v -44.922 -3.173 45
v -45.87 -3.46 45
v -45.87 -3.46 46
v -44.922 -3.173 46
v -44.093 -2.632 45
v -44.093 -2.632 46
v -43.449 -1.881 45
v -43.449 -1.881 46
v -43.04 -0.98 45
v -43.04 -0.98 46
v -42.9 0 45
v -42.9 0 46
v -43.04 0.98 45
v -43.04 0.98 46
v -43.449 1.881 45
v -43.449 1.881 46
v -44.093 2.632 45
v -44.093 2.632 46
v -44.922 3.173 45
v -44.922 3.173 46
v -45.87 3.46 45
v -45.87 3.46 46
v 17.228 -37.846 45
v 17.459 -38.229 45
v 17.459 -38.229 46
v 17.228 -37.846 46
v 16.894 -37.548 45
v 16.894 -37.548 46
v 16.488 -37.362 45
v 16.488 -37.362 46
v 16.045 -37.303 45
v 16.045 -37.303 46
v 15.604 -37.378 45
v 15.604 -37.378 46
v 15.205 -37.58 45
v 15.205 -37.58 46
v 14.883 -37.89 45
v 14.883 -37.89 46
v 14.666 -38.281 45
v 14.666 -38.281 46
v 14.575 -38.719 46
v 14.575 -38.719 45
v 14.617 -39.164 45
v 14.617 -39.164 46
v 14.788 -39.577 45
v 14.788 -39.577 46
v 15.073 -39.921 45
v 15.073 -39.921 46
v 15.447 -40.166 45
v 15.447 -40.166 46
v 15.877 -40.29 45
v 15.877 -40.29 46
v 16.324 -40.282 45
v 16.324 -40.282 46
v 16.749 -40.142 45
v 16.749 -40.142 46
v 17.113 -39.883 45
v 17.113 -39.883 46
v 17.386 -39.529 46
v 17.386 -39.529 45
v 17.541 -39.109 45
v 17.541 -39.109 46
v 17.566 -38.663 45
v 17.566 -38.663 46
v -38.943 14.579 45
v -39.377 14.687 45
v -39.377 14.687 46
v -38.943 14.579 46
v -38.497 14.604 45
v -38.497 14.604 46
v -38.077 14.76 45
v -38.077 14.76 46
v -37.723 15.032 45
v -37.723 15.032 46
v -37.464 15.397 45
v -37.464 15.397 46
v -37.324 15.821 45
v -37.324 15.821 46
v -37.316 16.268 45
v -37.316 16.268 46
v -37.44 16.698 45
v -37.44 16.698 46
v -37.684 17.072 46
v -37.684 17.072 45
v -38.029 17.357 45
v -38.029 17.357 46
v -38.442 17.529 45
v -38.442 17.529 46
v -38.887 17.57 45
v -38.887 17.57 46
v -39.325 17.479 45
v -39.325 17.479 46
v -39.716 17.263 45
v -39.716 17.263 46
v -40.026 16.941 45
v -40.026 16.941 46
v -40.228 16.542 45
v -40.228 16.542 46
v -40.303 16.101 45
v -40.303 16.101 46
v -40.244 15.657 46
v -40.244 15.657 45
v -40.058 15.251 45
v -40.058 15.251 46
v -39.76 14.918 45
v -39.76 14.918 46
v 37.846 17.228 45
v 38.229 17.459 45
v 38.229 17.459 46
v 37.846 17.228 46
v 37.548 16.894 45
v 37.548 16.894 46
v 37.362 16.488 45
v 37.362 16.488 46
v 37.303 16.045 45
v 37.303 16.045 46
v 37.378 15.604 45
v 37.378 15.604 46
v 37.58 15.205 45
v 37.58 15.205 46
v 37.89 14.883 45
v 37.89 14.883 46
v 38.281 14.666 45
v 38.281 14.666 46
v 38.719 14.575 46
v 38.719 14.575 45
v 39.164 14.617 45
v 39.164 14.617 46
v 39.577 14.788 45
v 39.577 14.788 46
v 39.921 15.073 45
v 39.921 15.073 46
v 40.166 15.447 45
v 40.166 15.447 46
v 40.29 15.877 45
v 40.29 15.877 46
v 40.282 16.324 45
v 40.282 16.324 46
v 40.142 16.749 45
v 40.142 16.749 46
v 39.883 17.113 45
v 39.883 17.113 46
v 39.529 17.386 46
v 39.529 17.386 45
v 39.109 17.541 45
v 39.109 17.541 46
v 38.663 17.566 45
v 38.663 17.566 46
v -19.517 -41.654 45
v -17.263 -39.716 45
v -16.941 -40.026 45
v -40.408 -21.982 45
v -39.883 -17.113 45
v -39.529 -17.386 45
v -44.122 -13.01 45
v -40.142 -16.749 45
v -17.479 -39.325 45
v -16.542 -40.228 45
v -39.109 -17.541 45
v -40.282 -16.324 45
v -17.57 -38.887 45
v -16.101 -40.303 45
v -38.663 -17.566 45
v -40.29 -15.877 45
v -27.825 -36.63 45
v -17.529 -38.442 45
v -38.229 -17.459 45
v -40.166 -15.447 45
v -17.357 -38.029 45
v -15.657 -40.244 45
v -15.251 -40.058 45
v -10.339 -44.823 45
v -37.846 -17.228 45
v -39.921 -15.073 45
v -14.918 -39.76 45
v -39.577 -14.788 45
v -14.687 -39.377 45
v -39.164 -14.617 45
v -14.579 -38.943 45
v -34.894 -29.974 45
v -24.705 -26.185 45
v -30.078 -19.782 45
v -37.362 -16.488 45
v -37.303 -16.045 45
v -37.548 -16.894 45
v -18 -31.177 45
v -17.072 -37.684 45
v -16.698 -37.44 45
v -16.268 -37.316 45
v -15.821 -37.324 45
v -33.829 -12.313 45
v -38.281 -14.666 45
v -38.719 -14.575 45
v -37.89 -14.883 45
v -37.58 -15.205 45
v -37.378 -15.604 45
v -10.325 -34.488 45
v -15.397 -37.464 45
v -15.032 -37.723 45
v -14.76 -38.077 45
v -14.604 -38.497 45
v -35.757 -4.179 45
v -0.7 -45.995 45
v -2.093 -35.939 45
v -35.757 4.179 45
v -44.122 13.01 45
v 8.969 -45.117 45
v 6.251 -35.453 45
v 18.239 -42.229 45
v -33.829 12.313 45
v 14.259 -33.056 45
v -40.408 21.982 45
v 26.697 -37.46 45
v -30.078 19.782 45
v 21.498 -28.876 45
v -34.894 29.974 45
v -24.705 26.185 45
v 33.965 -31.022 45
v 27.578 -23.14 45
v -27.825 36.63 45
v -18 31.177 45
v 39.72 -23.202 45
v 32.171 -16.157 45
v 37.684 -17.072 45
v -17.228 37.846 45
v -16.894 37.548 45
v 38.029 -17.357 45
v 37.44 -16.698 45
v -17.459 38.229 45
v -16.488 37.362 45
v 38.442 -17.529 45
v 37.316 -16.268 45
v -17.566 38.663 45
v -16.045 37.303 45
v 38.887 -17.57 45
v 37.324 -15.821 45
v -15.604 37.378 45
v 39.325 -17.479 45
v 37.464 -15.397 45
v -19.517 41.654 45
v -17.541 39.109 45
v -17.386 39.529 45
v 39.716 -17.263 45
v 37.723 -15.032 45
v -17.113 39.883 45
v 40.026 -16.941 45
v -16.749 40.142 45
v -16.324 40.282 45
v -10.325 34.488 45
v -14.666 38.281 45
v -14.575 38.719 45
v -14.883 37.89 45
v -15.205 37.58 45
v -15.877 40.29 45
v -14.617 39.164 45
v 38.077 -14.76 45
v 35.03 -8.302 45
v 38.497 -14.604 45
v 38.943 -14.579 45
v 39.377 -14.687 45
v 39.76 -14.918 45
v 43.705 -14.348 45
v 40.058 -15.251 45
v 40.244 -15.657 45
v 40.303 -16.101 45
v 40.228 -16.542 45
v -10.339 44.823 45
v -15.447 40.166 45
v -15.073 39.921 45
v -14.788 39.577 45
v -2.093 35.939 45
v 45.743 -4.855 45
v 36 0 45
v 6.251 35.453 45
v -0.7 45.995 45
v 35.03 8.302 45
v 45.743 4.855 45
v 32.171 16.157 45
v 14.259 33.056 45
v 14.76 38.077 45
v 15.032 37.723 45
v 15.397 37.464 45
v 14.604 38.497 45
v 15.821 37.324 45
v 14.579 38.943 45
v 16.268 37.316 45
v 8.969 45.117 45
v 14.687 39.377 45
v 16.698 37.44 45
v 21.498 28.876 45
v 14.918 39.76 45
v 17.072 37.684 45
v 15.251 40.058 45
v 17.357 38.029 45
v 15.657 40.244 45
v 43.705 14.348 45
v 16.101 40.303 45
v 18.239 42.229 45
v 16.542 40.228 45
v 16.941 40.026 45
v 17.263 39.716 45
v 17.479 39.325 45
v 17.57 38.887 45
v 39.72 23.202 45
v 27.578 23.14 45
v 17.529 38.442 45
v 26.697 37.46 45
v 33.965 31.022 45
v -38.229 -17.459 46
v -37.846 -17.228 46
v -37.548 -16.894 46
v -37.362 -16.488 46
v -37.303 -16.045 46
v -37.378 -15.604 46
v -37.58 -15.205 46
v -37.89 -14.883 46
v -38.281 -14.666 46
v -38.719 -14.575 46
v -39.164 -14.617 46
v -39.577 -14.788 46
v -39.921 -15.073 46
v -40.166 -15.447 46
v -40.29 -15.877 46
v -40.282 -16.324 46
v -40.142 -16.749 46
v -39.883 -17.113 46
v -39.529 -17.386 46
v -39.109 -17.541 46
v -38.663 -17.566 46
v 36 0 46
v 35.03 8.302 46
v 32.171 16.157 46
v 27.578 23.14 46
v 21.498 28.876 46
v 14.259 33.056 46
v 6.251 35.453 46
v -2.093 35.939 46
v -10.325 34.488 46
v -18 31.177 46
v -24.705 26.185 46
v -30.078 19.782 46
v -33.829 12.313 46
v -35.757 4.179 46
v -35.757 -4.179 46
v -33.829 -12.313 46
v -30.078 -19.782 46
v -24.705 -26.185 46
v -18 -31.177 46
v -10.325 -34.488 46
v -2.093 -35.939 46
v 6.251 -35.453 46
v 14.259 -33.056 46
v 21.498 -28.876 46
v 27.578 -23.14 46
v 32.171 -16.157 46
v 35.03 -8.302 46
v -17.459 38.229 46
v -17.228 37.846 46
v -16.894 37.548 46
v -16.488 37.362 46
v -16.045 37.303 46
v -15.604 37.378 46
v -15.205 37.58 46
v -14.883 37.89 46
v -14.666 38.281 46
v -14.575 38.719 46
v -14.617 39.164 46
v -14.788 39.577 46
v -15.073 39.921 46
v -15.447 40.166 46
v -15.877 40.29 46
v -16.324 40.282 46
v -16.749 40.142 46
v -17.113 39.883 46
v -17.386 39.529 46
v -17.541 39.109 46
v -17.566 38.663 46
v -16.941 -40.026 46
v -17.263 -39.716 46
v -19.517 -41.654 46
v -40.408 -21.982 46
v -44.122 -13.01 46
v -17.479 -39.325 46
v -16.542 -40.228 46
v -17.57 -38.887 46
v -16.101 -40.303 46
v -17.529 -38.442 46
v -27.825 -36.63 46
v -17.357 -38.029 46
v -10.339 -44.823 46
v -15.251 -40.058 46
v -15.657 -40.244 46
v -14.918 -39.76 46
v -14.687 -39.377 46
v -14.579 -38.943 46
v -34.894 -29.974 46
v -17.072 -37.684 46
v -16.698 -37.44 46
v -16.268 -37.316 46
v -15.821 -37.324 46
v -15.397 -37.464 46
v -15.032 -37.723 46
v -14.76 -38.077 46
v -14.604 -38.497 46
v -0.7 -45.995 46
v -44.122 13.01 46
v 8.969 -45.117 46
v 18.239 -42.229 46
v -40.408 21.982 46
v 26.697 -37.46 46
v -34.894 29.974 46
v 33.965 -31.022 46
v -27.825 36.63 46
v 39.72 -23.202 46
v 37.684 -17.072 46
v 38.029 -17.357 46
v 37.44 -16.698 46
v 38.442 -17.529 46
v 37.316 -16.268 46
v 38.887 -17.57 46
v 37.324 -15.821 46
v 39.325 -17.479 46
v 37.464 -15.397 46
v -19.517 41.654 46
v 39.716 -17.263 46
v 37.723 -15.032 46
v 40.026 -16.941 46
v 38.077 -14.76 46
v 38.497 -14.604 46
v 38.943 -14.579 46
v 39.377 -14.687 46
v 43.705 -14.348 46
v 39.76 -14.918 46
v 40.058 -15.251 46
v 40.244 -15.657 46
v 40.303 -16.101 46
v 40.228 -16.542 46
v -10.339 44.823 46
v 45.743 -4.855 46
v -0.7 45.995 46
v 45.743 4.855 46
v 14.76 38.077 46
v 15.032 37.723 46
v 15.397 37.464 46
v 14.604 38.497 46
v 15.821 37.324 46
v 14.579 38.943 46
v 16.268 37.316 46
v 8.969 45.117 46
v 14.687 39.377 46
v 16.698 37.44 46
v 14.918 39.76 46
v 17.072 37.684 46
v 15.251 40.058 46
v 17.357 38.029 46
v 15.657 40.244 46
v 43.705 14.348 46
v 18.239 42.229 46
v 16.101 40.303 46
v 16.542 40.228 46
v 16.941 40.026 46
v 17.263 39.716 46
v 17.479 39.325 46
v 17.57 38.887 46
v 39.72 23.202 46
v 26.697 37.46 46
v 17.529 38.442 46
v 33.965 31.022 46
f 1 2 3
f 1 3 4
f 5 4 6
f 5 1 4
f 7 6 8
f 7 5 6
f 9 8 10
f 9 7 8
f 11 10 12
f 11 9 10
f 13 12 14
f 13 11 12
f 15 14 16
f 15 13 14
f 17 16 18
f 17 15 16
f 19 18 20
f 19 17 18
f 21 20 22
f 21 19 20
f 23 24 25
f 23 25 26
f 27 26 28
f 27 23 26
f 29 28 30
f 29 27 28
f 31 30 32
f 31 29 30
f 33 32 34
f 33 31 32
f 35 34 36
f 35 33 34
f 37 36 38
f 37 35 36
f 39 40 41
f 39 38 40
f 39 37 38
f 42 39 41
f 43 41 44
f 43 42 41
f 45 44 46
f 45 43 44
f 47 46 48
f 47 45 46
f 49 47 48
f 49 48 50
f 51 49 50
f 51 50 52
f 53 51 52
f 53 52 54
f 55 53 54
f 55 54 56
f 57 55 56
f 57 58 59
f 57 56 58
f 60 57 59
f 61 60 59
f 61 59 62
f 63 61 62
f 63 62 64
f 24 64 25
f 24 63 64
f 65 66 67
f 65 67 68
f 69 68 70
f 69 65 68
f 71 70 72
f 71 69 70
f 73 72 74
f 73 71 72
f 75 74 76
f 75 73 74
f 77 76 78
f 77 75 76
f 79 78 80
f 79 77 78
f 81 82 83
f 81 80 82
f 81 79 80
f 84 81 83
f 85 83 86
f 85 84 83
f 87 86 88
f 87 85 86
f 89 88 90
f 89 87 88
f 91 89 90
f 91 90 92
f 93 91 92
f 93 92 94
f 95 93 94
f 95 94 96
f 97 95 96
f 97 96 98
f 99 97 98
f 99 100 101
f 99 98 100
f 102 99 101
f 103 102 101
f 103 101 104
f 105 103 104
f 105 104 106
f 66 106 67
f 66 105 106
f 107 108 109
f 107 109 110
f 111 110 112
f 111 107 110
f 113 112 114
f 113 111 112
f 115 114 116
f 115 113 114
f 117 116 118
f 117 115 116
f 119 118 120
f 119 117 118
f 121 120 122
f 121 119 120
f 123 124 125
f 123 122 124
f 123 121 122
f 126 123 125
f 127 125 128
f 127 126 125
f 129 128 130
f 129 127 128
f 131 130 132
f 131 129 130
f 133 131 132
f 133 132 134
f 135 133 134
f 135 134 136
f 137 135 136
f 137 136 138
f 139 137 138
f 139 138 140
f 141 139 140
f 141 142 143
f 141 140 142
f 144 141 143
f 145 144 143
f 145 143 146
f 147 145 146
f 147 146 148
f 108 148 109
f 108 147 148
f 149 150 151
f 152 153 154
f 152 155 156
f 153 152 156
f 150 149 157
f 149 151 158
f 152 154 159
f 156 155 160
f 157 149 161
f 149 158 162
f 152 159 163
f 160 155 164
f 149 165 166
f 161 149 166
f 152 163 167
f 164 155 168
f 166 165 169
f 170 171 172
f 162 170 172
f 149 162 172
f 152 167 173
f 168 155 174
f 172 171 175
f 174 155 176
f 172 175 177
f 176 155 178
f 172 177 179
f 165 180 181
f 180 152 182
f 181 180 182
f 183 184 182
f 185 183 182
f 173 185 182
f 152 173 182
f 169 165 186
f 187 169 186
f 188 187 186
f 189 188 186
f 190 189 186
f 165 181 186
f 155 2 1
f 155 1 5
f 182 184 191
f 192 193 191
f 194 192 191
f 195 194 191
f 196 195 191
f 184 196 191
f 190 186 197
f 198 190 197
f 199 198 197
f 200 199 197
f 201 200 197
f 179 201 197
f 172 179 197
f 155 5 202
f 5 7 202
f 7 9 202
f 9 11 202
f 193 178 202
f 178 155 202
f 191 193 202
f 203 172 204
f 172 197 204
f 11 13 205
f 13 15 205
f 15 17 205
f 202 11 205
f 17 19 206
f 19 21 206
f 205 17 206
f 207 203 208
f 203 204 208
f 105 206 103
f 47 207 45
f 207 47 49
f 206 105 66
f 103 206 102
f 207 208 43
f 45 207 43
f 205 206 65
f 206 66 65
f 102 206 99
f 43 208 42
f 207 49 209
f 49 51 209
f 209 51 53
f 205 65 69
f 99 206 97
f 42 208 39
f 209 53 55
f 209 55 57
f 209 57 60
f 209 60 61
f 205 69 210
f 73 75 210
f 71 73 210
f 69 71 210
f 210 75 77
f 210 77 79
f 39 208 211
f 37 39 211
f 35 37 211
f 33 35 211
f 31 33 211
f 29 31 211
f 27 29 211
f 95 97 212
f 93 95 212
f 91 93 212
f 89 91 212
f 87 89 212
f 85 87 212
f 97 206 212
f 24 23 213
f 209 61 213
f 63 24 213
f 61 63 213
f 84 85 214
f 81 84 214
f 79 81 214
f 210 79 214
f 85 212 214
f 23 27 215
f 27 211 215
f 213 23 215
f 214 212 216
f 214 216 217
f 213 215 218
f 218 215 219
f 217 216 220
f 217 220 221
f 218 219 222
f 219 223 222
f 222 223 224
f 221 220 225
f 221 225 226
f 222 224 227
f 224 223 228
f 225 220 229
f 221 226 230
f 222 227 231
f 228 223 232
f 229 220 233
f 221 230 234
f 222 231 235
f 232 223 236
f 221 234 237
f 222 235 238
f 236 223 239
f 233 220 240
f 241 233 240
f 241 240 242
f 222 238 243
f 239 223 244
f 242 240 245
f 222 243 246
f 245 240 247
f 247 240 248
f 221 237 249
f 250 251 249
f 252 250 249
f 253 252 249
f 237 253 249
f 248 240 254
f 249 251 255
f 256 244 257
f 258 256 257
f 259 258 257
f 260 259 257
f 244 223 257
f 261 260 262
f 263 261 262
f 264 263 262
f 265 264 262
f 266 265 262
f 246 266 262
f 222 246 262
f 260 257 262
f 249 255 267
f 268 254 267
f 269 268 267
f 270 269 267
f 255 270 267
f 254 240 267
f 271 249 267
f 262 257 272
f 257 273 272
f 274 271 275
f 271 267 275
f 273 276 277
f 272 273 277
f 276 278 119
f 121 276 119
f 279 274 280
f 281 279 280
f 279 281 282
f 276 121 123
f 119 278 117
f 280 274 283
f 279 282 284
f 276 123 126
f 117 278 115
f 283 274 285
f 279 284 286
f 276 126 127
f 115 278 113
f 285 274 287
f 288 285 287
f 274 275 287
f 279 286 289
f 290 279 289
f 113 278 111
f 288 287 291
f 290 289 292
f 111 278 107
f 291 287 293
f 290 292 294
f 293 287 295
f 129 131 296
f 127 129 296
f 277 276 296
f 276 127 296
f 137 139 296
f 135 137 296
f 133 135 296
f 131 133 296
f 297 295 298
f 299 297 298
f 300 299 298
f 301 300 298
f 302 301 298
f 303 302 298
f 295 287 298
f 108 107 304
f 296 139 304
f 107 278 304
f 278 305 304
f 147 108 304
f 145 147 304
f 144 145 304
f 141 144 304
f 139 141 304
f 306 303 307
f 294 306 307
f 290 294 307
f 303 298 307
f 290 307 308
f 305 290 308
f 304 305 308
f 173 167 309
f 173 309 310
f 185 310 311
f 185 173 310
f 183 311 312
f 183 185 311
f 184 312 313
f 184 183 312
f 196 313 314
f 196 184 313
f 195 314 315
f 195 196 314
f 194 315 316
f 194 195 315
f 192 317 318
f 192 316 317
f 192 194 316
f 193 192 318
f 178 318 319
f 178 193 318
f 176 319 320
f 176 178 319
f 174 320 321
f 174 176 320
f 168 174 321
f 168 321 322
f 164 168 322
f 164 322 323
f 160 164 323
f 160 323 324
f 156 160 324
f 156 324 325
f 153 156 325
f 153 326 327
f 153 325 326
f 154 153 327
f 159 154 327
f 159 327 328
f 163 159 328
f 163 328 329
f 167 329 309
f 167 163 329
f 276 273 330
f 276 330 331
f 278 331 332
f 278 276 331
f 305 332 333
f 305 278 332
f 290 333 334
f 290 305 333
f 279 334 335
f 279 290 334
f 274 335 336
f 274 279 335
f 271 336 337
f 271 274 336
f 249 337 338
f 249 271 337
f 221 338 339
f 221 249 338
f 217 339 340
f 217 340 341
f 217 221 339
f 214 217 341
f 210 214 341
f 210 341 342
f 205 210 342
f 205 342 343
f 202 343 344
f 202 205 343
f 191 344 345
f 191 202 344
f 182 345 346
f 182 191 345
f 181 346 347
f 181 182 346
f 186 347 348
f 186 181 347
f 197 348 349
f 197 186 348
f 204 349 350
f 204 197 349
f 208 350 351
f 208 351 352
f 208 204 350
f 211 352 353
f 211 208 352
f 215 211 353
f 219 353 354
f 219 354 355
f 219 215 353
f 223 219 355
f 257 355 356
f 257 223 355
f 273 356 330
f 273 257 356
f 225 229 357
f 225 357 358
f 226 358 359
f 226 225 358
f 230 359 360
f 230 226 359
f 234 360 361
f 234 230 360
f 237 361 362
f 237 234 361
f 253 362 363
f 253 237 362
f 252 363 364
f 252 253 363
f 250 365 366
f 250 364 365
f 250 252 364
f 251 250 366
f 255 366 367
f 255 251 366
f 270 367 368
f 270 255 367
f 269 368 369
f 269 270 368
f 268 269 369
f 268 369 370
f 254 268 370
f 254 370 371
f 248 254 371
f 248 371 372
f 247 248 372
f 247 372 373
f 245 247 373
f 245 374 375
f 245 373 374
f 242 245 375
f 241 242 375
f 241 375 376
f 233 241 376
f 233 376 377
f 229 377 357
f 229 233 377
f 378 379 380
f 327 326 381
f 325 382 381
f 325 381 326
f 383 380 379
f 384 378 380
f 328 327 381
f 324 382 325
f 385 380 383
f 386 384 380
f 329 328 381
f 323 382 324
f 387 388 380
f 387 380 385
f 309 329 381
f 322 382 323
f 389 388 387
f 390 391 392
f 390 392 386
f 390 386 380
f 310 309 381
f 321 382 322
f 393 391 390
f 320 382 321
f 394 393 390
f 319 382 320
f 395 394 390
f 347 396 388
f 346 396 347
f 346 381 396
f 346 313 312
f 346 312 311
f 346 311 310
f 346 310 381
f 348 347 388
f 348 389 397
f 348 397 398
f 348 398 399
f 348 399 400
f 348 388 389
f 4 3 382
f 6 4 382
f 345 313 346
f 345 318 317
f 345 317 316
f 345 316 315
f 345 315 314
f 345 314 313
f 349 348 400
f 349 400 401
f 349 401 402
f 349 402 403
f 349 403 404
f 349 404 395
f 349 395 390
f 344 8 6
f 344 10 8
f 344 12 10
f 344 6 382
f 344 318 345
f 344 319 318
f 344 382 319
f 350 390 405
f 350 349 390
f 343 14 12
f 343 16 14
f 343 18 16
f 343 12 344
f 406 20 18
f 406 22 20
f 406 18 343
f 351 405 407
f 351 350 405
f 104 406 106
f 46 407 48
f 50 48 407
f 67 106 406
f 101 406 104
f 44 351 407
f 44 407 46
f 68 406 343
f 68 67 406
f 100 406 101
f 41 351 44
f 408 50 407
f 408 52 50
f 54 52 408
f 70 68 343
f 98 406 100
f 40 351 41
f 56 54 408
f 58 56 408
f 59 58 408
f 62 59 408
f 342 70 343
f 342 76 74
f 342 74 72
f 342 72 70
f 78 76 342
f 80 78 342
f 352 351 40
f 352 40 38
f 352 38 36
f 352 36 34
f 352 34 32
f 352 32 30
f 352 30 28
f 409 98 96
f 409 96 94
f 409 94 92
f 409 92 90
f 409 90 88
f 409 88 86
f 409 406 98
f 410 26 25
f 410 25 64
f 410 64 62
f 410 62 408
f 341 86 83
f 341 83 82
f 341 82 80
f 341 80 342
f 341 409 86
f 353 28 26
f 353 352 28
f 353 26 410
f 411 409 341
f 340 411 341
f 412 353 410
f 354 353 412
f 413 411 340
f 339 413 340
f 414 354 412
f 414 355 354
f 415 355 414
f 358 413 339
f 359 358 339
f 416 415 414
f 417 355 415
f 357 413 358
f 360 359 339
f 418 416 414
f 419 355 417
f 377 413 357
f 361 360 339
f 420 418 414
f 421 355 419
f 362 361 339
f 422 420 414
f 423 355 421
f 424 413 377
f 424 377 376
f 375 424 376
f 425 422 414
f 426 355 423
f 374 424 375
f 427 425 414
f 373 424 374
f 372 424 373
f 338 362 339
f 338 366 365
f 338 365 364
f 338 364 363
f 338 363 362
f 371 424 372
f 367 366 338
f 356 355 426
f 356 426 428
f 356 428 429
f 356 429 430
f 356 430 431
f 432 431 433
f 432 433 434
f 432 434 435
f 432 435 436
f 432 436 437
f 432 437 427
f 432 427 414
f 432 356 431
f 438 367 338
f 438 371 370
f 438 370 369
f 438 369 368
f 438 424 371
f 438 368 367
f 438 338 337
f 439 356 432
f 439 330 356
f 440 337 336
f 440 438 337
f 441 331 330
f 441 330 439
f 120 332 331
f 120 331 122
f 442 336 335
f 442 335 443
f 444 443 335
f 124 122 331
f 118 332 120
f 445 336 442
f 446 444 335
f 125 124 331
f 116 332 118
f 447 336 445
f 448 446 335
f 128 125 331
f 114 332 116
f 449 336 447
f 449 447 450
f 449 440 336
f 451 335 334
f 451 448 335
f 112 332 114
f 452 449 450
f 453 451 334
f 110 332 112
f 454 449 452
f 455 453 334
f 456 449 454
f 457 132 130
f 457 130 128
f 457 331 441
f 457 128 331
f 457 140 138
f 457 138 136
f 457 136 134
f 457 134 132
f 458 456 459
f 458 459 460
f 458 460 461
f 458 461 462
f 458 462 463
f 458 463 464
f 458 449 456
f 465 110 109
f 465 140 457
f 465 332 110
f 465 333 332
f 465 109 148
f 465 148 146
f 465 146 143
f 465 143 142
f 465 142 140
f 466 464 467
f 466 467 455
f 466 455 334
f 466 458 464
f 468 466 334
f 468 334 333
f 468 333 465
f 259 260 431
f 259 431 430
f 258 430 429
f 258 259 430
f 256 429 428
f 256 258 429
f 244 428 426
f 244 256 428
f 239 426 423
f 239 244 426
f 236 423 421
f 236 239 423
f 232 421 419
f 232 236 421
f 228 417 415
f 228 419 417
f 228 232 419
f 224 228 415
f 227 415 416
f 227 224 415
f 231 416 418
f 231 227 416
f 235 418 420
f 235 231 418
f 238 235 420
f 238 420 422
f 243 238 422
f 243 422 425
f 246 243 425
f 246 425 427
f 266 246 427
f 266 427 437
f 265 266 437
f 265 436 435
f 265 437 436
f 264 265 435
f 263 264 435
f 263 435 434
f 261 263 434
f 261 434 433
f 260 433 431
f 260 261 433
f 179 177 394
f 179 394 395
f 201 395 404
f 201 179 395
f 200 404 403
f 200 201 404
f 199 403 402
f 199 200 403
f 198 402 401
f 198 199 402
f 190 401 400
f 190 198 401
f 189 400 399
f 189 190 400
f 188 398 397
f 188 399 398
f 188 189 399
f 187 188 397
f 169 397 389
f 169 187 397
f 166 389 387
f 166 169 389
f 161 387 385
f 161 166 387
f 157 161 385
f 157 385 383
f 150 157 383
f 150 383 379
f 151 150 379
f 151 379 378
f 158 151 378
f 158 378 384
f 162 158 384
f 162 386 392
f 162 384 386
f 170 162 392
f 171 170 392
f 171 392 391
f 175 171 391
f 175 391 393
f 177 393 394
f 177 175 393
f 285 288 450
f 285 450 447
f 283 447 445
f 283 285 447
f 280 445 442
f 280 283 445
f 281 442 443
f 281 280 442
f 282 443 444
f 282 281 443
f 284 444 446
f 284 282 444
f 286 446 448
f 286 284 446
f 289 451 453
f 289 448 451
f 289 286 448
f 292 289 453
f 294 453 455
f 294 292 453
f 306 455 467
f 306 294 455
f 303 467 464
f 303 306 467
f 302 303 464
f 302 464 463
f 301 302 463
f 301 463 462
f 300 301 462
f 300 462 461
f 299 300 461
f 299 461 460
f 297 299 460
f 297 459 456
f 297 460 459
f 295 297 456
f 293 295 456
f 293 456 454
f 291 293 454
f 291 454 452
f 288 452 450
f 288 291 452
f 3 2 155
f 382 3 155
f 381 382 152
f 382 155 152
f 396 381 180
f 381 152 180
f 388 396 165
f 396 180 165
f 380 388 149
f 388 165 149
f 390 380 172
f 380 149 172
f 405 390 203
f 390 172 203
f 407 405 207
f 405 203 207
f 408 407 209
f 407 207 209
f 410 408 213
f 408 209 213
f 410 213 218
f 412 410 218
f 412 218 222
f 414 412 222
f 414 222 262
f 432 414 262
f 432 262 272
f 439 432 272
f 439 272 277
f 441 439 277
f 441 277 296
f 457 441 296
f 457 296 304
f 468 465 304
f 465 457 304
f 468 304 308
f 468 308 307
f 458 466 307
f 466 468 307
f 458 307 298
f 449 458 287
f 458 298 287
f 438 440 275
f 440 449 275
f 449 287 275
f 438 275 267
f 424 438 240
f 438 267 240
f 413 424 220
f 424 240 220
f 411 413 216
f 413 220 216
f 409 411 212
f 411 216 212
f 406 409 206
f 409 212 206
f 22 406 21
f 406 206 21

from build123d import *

# Parameters (mm, degrees)
BOX433_W                     = 6
BOX433_H                     = 8
BOX433_DEPTH                 = 2
BOX433_PLACEMENT_ANGLE       = 45
BOX435_W                     = 6
BOX435_H                     = 8
BOX435_DEPTH                 = 2
BOX426_W                     = 6
BOX426_H                     = 8
BOX426_DEPTH                 = 2
BOX438_W                     = 6
BOX438_H                     = 8
BOX438_DEPTH                 = 2
BOX438_PLACEMENT_ANGLE       = 135
BOX436_W                     = 6
BOX436_H                     = 8
BOX436_DEPTH                 = 2
BOX440_W                     = 6
BOX440_H                     = 8
BOX440_DEPTH                 = 2
BOX440_PLACEMENT_ANGLE       = 225
BOX429_W                     = 6
BOX429_H                     = 8
BOX429_DEPTH                 = 2
BOX439_W                     = 6
BOX439_H                     = 8
BOX439_DEPTH                 = 2
BOX439_PLACEMENT_ANGLE       = 45
COMPOUND873_PLACEMENT_ANGLE  = 22.5
CYLINDER1120_R               = 1.5
CYLINDER1120_DEPTH           = 12
CYLINDER1120_PLACEMENT_ANGLE = 45
CYLINDER1128_R               = 1.5
CYLINDER1128_DEPTH           = 12
CYLINDER1126_R               = 1.5
CYLINDER1126_DEPTH           = 12
CYLINDER1126_PLACEMENT_ANGLE = 135
CYLINDER1125_R               = 1.5
CYLINDER1125_DEPTH           = 12
CYLINDER1127_R               = 1.5
CYLINDER1127_DEPTH           = 12
CYLINDER1127_PLACEMENT_ANGLE = 225
CYLINDER1124_R               = 1.5
CYLINDER1124_DEPTH           = 12
CYLINDER1119_R               = 1.5
CYLINDER1119_DEPTH           = 12
CYLINDER1119_PLACEMENT_ANGLE = 45
CYLINDER1122_R               = 1.5
CYLINDER1122_DEPTH           = 12
COMPOUND874_PLACEMENT_ANGLE  = 22.5
CYLINDER1117_R               = 3.5
CYLINDER1117_DEPTH           = 20
TUBE101_R                    = 46
TUBE101_R_2                  = 36
TUBE101_DEPTH                = 1


with BuildPart() as krychle433:
    # Box433 → Box433 (new body)
    with BuildSketch(Plane.XY):
        with Locations((3, 4)):
            Rectangle(BOX433_W, BOX433_H)
    extrude(amount=BOX433_DEPTH)


with BuildPart() as krychle433_1:
    # Box433 placement: moved
    add(krychle433.part.moved(Location((30.405592, -34.648232, 33))).rotate(Axis((30.405592, -34.648232, 33), (0, 0, 1)), BOX433_PLACEMENT_ANGLE))


with BuildPart() as krychle435:
    # Box435 → Box435 (new body)
    with BuildSketch(Plane(origin=(46, -3, 33), x_dir=(0, 1, 0), z_dir=(0, 0, 1))):
        with Locations((3, 4)):
            Rectangle(BOX435_W, BOX435_H)
    extrude(amount=BOX435_DEPTH)


with BuildPart() as krychle426:
    # Box426 → Box426 (new body)
    with BuildSketch(Plane(origin=(-3, -46, 33), x_dir=(1, 0, 0), z_dir=(0, 0, 1))):
        with Locations((3, 4)):
            Rectangle(BOX426_W, BOX426_H)
    extrude(amount=BOX426_DEPTH)


with BuildPart() as krychle438:
    # Box438 → Box438 (new body)
    with BuildSketch(Plane.XY):
        with Locations((3, 4)):
            Rectangle(BOX438_W, BOX438_H)
    extrude(amount=BOX438_DEPTH)


with BuildPart() as krychle438_1:
    # Box438 placement: moved
    add(krychle438.part.moved(Location((34.648232, 30.405592, 33))).rotate(Axis((34.648232, 30.405592, 33), (0, 0, 1)), BOX438_PLACEMENT_ANGLE))


with BuildPart() as krychle436:
    # Box436 → Box436 (new body)
    with BuildSketch(Plane(origin=(3, 46, 33), x_dir=(-1, 0, 0), z_dir=(0, 0, 1))):
        with Locations((3, 4)):
            Rectangle(BOX436_W, BOX436_H)
    extrude(amount=BOX436_DEPTH)


with BuildPart() as krychle440:
    # Box440 → Box440 (new body)
    with BuildSketch(Plane.XY):
        with Locations((3, 4)):
            Rectangle(BOX440_W, BOX440_H)
    extrude(amount=BOX440_DEPTH)


with BuildPart() as krychle440_1:
    # Box440 placement: moved
    add(krychle440.part.moved(Location((-30.405592, 34.648232, 33))).rotate(Axis((-30.405592, 34.648232, 33), (0, 0, 1)), BOX440_PLACEMENT_ANGLE))


with BuildPart() as krychle429:
    # Box429 → Box429 (new body)
    with BuildSketch(Plane(origin=(-46, 3, 33), x_dir=(0, -1, 0), z_dir=(0, 0, 1))):
        with Locations((3, 4)):
            Rectangle(BOX429_W, BOX429_H)
    extrude(amount=BOX429_DEPTH)


with BuildPart() as compound873:
    # Box439 → Box439 (new body)
    with BuildSketch(Plane.XY):
        with Locations((3, 4)):
            Rectangle(BOX439_W, BOX439_H)
    extrude(amount=BOX439_DEPTH)


with BuildPart() as compound873_1:
    # Box439 placement: moved
    add(compound873.part.moved(Location((-34.648232, -30.405592, 33))).rotate(Axis((-34.648232, -30.405592, 33), (0, 0, -1)), BOX439_PLACEMENT_ANGLE))

    # Compound873: union Krychle433, Krychle435, Krychle426, Krychle438, Krychle436, Krychle440, Krychle429
    add(krychle433_1.part)
    add(krychle435.part)
    add(krychle426.part)
    add(krychle438_1.part)
    add(krychle436.part)
    add(krychle440_1.part)
    add(krychle429.part)


with BuildPart() as compound873_2:
    # Compound873 placement: moved
    add(compound873_1.part.moved(Location((0, 0, 7))).rotate(Axis((0, 0, 7), (0, 0, 1)), COMPOUND873_PLACEMENT_ANGLE))


with BuildPart() as v_lec1120:
    # Cylinder1120 → Cylinder1120 (new body)
    with BuildSketch(Plane.XY):
        Circle(CYLINDER1120_R)
    extrude(amount=CYLINDER1120_DEPTH)


with BuildPart() as v_lec1120_1:
    # Cylinder1120 placement: moved
    add(v_lec1120.part.moved(Location((29.698485, -29.698485, 33.5))).rotate(Axis((29.698485, -29.698485, 33.5), (0, 0, 1)), CYLINDER1120_PLACEMENT_ANGLE))


with BuildPart() as v_lec1128:
    # Cylinder1128 → Cylinder1128 (new body)
    with BuildSketch(Plane(origin=(42, 0, 33.5), x_dir=(0, 1, 0), z_dir=(0, 0, 1))):
        Circle(CYLINDER1128_R)
    extrude(amount=CYLINDER1128_DEPTH)


with BuildPart() as v_lec1126:
    # Cylinder1126 → Cylinder1126 (new body)
    with BuildSketch(Plane.XY):
        Circle(CYLINDER1126_R)
    extrude(amount=CYLINDER1126_DEPTH)


with BuildPart() as v_lec1126_1:
    # Cylinder1126 placement: moved
    add(v_lec1126.part.moved(Location((29.698485, 29.698485, 33.5))).rotate(Axis((29.698485, 29.698485, 33.5), (0, 0, 1)), CYLINDER1126_PLACEMENT_ANGLE))


with BuildPart() as v_lec1125:
    # Cylinder1125 → Cylinder1125 (new body)
    with BuildSketch(Plane(origin=(0, 42, 33.5), x_dir=(-1, 0, 0), z_dir=(0, 0, 1))):
        Circle(CYLINDER1125_R)
    extrude(amount=CYLINDER1125_DEPTH)


with BuildPart() as v_lec1127:
    # Cylinder1127 → Cylinder1127 (new body)
    with BuildSketch(Plane.XY):
        Circle(CYLINDER1127_R)
    extrude(amount=CYLINDER1127_DEPTH)


with BuildPart() as v_lec1127_1:
    # Cylinder1127 placement: moved
    add(v_lec1127.part.moved(Location((-29.698485, 29.698485, 33.5))).rotate(Axis((-29.698485, 29.698485, 33.5), (0, 0, 1)), CYLINDER1127_PLACEMENT_ANGLE))


with BuildPart() as v_lec1124:
    # Cylinder1124 → Cylinder1124 (new body)
    with BuildSketch(Plane(origin=(-42, 0, 33.5), x_dir=(0, -1, 0), z_dir=(0, 0, 1))):
        Circle(CYLINDER1124_R)
    extrude(amount=CYLINDER1124_DEPTH)


with BuildPart() as v_lec1119:
    # Cylinder1119 → Cylinder1119 (new body)
    with BuildSketch(Plane.XY):
        Circle(CYLINDER1119_R)
    extrude(amount=CYLINDER1119_DEPTH)


with BuildPart() as v_lec1119_1:
    # Cylinder1119 placement: moved
    add(v_lec1119.part.moved(Location((-29.698485, -29.698485, 33.5))).rotate(Axis((-29.698485, -29.698485, 33.5), (0, 0, -1)), CYLINDER1119_PLACEMENT_ANGLE))


with BuildPart() as compound874:
    # Cylinder1122 → Cylinder1122 (new body)
    with BuildSketch(Plane(origin=(0, -42, 33.5), x_dir=(1, 0, 0), z_dir=(0, 0, 1))):
        Circle(CYLINDER1122_R)
    extrude(amount=CYLINDER1122_DEPTH)

    # Compound874: union Válec1120, Válec1128, Válec1126, Válec1125, Válec1127, Válec1124, Válec1119
    add(v_lec1120_1.part)
    add(v_lec1128.part)
    add(v_lec1126_1.part)
    add(v_lec1125.part)
    add(v_lec1127_1.part)
    add(v_lec1124.part)
    add(v_lec1119_1.part)


with BuildPart() as compound874_1:
    # Compound874 placement: moved
    add(compound874.part.moved(Location((0, 0, 4))).rotate(Axis((0, 0, 4), (0, 0, 1)), COMPOUND874_PLACEMENT_ANGLE))


with BuildPart() as v_lec1117:
    # Cylinder1117 → Cylinder1117 (new body)
    with BuildSketch(Plane(origin=(-46.4, 0, 34), x_dir=(1, 0, 0), z_dir=(0, 0, 1))):
        Circle(CYLINDER1117_R)
    extrude(amount=CYLINDER1117_DEPTH)


with BuildPart() as cut422:
    # Tube101 → Tube101 (new body)
    with BuildSketch(Plane.XY.offset(45)):
        Circle(TUBE101_R)
        Circle(TUBE101_R_2, mode=Mode.SUBTRACT)
    extrude(amount=TUBE101_DEPTH)

    # Cut424: cut Válec1117
    add(v_lec1117.part, mode=Mode.SUBTRACT)

    # Cut425: cut Compound874
    add(compound874_1.part, mode=Mode.SUBTRACT)

    # Cut422: cut Compound873
    add(compound873_2.part, mode=Mode.SUBTRACT)


solid = cut422.part
